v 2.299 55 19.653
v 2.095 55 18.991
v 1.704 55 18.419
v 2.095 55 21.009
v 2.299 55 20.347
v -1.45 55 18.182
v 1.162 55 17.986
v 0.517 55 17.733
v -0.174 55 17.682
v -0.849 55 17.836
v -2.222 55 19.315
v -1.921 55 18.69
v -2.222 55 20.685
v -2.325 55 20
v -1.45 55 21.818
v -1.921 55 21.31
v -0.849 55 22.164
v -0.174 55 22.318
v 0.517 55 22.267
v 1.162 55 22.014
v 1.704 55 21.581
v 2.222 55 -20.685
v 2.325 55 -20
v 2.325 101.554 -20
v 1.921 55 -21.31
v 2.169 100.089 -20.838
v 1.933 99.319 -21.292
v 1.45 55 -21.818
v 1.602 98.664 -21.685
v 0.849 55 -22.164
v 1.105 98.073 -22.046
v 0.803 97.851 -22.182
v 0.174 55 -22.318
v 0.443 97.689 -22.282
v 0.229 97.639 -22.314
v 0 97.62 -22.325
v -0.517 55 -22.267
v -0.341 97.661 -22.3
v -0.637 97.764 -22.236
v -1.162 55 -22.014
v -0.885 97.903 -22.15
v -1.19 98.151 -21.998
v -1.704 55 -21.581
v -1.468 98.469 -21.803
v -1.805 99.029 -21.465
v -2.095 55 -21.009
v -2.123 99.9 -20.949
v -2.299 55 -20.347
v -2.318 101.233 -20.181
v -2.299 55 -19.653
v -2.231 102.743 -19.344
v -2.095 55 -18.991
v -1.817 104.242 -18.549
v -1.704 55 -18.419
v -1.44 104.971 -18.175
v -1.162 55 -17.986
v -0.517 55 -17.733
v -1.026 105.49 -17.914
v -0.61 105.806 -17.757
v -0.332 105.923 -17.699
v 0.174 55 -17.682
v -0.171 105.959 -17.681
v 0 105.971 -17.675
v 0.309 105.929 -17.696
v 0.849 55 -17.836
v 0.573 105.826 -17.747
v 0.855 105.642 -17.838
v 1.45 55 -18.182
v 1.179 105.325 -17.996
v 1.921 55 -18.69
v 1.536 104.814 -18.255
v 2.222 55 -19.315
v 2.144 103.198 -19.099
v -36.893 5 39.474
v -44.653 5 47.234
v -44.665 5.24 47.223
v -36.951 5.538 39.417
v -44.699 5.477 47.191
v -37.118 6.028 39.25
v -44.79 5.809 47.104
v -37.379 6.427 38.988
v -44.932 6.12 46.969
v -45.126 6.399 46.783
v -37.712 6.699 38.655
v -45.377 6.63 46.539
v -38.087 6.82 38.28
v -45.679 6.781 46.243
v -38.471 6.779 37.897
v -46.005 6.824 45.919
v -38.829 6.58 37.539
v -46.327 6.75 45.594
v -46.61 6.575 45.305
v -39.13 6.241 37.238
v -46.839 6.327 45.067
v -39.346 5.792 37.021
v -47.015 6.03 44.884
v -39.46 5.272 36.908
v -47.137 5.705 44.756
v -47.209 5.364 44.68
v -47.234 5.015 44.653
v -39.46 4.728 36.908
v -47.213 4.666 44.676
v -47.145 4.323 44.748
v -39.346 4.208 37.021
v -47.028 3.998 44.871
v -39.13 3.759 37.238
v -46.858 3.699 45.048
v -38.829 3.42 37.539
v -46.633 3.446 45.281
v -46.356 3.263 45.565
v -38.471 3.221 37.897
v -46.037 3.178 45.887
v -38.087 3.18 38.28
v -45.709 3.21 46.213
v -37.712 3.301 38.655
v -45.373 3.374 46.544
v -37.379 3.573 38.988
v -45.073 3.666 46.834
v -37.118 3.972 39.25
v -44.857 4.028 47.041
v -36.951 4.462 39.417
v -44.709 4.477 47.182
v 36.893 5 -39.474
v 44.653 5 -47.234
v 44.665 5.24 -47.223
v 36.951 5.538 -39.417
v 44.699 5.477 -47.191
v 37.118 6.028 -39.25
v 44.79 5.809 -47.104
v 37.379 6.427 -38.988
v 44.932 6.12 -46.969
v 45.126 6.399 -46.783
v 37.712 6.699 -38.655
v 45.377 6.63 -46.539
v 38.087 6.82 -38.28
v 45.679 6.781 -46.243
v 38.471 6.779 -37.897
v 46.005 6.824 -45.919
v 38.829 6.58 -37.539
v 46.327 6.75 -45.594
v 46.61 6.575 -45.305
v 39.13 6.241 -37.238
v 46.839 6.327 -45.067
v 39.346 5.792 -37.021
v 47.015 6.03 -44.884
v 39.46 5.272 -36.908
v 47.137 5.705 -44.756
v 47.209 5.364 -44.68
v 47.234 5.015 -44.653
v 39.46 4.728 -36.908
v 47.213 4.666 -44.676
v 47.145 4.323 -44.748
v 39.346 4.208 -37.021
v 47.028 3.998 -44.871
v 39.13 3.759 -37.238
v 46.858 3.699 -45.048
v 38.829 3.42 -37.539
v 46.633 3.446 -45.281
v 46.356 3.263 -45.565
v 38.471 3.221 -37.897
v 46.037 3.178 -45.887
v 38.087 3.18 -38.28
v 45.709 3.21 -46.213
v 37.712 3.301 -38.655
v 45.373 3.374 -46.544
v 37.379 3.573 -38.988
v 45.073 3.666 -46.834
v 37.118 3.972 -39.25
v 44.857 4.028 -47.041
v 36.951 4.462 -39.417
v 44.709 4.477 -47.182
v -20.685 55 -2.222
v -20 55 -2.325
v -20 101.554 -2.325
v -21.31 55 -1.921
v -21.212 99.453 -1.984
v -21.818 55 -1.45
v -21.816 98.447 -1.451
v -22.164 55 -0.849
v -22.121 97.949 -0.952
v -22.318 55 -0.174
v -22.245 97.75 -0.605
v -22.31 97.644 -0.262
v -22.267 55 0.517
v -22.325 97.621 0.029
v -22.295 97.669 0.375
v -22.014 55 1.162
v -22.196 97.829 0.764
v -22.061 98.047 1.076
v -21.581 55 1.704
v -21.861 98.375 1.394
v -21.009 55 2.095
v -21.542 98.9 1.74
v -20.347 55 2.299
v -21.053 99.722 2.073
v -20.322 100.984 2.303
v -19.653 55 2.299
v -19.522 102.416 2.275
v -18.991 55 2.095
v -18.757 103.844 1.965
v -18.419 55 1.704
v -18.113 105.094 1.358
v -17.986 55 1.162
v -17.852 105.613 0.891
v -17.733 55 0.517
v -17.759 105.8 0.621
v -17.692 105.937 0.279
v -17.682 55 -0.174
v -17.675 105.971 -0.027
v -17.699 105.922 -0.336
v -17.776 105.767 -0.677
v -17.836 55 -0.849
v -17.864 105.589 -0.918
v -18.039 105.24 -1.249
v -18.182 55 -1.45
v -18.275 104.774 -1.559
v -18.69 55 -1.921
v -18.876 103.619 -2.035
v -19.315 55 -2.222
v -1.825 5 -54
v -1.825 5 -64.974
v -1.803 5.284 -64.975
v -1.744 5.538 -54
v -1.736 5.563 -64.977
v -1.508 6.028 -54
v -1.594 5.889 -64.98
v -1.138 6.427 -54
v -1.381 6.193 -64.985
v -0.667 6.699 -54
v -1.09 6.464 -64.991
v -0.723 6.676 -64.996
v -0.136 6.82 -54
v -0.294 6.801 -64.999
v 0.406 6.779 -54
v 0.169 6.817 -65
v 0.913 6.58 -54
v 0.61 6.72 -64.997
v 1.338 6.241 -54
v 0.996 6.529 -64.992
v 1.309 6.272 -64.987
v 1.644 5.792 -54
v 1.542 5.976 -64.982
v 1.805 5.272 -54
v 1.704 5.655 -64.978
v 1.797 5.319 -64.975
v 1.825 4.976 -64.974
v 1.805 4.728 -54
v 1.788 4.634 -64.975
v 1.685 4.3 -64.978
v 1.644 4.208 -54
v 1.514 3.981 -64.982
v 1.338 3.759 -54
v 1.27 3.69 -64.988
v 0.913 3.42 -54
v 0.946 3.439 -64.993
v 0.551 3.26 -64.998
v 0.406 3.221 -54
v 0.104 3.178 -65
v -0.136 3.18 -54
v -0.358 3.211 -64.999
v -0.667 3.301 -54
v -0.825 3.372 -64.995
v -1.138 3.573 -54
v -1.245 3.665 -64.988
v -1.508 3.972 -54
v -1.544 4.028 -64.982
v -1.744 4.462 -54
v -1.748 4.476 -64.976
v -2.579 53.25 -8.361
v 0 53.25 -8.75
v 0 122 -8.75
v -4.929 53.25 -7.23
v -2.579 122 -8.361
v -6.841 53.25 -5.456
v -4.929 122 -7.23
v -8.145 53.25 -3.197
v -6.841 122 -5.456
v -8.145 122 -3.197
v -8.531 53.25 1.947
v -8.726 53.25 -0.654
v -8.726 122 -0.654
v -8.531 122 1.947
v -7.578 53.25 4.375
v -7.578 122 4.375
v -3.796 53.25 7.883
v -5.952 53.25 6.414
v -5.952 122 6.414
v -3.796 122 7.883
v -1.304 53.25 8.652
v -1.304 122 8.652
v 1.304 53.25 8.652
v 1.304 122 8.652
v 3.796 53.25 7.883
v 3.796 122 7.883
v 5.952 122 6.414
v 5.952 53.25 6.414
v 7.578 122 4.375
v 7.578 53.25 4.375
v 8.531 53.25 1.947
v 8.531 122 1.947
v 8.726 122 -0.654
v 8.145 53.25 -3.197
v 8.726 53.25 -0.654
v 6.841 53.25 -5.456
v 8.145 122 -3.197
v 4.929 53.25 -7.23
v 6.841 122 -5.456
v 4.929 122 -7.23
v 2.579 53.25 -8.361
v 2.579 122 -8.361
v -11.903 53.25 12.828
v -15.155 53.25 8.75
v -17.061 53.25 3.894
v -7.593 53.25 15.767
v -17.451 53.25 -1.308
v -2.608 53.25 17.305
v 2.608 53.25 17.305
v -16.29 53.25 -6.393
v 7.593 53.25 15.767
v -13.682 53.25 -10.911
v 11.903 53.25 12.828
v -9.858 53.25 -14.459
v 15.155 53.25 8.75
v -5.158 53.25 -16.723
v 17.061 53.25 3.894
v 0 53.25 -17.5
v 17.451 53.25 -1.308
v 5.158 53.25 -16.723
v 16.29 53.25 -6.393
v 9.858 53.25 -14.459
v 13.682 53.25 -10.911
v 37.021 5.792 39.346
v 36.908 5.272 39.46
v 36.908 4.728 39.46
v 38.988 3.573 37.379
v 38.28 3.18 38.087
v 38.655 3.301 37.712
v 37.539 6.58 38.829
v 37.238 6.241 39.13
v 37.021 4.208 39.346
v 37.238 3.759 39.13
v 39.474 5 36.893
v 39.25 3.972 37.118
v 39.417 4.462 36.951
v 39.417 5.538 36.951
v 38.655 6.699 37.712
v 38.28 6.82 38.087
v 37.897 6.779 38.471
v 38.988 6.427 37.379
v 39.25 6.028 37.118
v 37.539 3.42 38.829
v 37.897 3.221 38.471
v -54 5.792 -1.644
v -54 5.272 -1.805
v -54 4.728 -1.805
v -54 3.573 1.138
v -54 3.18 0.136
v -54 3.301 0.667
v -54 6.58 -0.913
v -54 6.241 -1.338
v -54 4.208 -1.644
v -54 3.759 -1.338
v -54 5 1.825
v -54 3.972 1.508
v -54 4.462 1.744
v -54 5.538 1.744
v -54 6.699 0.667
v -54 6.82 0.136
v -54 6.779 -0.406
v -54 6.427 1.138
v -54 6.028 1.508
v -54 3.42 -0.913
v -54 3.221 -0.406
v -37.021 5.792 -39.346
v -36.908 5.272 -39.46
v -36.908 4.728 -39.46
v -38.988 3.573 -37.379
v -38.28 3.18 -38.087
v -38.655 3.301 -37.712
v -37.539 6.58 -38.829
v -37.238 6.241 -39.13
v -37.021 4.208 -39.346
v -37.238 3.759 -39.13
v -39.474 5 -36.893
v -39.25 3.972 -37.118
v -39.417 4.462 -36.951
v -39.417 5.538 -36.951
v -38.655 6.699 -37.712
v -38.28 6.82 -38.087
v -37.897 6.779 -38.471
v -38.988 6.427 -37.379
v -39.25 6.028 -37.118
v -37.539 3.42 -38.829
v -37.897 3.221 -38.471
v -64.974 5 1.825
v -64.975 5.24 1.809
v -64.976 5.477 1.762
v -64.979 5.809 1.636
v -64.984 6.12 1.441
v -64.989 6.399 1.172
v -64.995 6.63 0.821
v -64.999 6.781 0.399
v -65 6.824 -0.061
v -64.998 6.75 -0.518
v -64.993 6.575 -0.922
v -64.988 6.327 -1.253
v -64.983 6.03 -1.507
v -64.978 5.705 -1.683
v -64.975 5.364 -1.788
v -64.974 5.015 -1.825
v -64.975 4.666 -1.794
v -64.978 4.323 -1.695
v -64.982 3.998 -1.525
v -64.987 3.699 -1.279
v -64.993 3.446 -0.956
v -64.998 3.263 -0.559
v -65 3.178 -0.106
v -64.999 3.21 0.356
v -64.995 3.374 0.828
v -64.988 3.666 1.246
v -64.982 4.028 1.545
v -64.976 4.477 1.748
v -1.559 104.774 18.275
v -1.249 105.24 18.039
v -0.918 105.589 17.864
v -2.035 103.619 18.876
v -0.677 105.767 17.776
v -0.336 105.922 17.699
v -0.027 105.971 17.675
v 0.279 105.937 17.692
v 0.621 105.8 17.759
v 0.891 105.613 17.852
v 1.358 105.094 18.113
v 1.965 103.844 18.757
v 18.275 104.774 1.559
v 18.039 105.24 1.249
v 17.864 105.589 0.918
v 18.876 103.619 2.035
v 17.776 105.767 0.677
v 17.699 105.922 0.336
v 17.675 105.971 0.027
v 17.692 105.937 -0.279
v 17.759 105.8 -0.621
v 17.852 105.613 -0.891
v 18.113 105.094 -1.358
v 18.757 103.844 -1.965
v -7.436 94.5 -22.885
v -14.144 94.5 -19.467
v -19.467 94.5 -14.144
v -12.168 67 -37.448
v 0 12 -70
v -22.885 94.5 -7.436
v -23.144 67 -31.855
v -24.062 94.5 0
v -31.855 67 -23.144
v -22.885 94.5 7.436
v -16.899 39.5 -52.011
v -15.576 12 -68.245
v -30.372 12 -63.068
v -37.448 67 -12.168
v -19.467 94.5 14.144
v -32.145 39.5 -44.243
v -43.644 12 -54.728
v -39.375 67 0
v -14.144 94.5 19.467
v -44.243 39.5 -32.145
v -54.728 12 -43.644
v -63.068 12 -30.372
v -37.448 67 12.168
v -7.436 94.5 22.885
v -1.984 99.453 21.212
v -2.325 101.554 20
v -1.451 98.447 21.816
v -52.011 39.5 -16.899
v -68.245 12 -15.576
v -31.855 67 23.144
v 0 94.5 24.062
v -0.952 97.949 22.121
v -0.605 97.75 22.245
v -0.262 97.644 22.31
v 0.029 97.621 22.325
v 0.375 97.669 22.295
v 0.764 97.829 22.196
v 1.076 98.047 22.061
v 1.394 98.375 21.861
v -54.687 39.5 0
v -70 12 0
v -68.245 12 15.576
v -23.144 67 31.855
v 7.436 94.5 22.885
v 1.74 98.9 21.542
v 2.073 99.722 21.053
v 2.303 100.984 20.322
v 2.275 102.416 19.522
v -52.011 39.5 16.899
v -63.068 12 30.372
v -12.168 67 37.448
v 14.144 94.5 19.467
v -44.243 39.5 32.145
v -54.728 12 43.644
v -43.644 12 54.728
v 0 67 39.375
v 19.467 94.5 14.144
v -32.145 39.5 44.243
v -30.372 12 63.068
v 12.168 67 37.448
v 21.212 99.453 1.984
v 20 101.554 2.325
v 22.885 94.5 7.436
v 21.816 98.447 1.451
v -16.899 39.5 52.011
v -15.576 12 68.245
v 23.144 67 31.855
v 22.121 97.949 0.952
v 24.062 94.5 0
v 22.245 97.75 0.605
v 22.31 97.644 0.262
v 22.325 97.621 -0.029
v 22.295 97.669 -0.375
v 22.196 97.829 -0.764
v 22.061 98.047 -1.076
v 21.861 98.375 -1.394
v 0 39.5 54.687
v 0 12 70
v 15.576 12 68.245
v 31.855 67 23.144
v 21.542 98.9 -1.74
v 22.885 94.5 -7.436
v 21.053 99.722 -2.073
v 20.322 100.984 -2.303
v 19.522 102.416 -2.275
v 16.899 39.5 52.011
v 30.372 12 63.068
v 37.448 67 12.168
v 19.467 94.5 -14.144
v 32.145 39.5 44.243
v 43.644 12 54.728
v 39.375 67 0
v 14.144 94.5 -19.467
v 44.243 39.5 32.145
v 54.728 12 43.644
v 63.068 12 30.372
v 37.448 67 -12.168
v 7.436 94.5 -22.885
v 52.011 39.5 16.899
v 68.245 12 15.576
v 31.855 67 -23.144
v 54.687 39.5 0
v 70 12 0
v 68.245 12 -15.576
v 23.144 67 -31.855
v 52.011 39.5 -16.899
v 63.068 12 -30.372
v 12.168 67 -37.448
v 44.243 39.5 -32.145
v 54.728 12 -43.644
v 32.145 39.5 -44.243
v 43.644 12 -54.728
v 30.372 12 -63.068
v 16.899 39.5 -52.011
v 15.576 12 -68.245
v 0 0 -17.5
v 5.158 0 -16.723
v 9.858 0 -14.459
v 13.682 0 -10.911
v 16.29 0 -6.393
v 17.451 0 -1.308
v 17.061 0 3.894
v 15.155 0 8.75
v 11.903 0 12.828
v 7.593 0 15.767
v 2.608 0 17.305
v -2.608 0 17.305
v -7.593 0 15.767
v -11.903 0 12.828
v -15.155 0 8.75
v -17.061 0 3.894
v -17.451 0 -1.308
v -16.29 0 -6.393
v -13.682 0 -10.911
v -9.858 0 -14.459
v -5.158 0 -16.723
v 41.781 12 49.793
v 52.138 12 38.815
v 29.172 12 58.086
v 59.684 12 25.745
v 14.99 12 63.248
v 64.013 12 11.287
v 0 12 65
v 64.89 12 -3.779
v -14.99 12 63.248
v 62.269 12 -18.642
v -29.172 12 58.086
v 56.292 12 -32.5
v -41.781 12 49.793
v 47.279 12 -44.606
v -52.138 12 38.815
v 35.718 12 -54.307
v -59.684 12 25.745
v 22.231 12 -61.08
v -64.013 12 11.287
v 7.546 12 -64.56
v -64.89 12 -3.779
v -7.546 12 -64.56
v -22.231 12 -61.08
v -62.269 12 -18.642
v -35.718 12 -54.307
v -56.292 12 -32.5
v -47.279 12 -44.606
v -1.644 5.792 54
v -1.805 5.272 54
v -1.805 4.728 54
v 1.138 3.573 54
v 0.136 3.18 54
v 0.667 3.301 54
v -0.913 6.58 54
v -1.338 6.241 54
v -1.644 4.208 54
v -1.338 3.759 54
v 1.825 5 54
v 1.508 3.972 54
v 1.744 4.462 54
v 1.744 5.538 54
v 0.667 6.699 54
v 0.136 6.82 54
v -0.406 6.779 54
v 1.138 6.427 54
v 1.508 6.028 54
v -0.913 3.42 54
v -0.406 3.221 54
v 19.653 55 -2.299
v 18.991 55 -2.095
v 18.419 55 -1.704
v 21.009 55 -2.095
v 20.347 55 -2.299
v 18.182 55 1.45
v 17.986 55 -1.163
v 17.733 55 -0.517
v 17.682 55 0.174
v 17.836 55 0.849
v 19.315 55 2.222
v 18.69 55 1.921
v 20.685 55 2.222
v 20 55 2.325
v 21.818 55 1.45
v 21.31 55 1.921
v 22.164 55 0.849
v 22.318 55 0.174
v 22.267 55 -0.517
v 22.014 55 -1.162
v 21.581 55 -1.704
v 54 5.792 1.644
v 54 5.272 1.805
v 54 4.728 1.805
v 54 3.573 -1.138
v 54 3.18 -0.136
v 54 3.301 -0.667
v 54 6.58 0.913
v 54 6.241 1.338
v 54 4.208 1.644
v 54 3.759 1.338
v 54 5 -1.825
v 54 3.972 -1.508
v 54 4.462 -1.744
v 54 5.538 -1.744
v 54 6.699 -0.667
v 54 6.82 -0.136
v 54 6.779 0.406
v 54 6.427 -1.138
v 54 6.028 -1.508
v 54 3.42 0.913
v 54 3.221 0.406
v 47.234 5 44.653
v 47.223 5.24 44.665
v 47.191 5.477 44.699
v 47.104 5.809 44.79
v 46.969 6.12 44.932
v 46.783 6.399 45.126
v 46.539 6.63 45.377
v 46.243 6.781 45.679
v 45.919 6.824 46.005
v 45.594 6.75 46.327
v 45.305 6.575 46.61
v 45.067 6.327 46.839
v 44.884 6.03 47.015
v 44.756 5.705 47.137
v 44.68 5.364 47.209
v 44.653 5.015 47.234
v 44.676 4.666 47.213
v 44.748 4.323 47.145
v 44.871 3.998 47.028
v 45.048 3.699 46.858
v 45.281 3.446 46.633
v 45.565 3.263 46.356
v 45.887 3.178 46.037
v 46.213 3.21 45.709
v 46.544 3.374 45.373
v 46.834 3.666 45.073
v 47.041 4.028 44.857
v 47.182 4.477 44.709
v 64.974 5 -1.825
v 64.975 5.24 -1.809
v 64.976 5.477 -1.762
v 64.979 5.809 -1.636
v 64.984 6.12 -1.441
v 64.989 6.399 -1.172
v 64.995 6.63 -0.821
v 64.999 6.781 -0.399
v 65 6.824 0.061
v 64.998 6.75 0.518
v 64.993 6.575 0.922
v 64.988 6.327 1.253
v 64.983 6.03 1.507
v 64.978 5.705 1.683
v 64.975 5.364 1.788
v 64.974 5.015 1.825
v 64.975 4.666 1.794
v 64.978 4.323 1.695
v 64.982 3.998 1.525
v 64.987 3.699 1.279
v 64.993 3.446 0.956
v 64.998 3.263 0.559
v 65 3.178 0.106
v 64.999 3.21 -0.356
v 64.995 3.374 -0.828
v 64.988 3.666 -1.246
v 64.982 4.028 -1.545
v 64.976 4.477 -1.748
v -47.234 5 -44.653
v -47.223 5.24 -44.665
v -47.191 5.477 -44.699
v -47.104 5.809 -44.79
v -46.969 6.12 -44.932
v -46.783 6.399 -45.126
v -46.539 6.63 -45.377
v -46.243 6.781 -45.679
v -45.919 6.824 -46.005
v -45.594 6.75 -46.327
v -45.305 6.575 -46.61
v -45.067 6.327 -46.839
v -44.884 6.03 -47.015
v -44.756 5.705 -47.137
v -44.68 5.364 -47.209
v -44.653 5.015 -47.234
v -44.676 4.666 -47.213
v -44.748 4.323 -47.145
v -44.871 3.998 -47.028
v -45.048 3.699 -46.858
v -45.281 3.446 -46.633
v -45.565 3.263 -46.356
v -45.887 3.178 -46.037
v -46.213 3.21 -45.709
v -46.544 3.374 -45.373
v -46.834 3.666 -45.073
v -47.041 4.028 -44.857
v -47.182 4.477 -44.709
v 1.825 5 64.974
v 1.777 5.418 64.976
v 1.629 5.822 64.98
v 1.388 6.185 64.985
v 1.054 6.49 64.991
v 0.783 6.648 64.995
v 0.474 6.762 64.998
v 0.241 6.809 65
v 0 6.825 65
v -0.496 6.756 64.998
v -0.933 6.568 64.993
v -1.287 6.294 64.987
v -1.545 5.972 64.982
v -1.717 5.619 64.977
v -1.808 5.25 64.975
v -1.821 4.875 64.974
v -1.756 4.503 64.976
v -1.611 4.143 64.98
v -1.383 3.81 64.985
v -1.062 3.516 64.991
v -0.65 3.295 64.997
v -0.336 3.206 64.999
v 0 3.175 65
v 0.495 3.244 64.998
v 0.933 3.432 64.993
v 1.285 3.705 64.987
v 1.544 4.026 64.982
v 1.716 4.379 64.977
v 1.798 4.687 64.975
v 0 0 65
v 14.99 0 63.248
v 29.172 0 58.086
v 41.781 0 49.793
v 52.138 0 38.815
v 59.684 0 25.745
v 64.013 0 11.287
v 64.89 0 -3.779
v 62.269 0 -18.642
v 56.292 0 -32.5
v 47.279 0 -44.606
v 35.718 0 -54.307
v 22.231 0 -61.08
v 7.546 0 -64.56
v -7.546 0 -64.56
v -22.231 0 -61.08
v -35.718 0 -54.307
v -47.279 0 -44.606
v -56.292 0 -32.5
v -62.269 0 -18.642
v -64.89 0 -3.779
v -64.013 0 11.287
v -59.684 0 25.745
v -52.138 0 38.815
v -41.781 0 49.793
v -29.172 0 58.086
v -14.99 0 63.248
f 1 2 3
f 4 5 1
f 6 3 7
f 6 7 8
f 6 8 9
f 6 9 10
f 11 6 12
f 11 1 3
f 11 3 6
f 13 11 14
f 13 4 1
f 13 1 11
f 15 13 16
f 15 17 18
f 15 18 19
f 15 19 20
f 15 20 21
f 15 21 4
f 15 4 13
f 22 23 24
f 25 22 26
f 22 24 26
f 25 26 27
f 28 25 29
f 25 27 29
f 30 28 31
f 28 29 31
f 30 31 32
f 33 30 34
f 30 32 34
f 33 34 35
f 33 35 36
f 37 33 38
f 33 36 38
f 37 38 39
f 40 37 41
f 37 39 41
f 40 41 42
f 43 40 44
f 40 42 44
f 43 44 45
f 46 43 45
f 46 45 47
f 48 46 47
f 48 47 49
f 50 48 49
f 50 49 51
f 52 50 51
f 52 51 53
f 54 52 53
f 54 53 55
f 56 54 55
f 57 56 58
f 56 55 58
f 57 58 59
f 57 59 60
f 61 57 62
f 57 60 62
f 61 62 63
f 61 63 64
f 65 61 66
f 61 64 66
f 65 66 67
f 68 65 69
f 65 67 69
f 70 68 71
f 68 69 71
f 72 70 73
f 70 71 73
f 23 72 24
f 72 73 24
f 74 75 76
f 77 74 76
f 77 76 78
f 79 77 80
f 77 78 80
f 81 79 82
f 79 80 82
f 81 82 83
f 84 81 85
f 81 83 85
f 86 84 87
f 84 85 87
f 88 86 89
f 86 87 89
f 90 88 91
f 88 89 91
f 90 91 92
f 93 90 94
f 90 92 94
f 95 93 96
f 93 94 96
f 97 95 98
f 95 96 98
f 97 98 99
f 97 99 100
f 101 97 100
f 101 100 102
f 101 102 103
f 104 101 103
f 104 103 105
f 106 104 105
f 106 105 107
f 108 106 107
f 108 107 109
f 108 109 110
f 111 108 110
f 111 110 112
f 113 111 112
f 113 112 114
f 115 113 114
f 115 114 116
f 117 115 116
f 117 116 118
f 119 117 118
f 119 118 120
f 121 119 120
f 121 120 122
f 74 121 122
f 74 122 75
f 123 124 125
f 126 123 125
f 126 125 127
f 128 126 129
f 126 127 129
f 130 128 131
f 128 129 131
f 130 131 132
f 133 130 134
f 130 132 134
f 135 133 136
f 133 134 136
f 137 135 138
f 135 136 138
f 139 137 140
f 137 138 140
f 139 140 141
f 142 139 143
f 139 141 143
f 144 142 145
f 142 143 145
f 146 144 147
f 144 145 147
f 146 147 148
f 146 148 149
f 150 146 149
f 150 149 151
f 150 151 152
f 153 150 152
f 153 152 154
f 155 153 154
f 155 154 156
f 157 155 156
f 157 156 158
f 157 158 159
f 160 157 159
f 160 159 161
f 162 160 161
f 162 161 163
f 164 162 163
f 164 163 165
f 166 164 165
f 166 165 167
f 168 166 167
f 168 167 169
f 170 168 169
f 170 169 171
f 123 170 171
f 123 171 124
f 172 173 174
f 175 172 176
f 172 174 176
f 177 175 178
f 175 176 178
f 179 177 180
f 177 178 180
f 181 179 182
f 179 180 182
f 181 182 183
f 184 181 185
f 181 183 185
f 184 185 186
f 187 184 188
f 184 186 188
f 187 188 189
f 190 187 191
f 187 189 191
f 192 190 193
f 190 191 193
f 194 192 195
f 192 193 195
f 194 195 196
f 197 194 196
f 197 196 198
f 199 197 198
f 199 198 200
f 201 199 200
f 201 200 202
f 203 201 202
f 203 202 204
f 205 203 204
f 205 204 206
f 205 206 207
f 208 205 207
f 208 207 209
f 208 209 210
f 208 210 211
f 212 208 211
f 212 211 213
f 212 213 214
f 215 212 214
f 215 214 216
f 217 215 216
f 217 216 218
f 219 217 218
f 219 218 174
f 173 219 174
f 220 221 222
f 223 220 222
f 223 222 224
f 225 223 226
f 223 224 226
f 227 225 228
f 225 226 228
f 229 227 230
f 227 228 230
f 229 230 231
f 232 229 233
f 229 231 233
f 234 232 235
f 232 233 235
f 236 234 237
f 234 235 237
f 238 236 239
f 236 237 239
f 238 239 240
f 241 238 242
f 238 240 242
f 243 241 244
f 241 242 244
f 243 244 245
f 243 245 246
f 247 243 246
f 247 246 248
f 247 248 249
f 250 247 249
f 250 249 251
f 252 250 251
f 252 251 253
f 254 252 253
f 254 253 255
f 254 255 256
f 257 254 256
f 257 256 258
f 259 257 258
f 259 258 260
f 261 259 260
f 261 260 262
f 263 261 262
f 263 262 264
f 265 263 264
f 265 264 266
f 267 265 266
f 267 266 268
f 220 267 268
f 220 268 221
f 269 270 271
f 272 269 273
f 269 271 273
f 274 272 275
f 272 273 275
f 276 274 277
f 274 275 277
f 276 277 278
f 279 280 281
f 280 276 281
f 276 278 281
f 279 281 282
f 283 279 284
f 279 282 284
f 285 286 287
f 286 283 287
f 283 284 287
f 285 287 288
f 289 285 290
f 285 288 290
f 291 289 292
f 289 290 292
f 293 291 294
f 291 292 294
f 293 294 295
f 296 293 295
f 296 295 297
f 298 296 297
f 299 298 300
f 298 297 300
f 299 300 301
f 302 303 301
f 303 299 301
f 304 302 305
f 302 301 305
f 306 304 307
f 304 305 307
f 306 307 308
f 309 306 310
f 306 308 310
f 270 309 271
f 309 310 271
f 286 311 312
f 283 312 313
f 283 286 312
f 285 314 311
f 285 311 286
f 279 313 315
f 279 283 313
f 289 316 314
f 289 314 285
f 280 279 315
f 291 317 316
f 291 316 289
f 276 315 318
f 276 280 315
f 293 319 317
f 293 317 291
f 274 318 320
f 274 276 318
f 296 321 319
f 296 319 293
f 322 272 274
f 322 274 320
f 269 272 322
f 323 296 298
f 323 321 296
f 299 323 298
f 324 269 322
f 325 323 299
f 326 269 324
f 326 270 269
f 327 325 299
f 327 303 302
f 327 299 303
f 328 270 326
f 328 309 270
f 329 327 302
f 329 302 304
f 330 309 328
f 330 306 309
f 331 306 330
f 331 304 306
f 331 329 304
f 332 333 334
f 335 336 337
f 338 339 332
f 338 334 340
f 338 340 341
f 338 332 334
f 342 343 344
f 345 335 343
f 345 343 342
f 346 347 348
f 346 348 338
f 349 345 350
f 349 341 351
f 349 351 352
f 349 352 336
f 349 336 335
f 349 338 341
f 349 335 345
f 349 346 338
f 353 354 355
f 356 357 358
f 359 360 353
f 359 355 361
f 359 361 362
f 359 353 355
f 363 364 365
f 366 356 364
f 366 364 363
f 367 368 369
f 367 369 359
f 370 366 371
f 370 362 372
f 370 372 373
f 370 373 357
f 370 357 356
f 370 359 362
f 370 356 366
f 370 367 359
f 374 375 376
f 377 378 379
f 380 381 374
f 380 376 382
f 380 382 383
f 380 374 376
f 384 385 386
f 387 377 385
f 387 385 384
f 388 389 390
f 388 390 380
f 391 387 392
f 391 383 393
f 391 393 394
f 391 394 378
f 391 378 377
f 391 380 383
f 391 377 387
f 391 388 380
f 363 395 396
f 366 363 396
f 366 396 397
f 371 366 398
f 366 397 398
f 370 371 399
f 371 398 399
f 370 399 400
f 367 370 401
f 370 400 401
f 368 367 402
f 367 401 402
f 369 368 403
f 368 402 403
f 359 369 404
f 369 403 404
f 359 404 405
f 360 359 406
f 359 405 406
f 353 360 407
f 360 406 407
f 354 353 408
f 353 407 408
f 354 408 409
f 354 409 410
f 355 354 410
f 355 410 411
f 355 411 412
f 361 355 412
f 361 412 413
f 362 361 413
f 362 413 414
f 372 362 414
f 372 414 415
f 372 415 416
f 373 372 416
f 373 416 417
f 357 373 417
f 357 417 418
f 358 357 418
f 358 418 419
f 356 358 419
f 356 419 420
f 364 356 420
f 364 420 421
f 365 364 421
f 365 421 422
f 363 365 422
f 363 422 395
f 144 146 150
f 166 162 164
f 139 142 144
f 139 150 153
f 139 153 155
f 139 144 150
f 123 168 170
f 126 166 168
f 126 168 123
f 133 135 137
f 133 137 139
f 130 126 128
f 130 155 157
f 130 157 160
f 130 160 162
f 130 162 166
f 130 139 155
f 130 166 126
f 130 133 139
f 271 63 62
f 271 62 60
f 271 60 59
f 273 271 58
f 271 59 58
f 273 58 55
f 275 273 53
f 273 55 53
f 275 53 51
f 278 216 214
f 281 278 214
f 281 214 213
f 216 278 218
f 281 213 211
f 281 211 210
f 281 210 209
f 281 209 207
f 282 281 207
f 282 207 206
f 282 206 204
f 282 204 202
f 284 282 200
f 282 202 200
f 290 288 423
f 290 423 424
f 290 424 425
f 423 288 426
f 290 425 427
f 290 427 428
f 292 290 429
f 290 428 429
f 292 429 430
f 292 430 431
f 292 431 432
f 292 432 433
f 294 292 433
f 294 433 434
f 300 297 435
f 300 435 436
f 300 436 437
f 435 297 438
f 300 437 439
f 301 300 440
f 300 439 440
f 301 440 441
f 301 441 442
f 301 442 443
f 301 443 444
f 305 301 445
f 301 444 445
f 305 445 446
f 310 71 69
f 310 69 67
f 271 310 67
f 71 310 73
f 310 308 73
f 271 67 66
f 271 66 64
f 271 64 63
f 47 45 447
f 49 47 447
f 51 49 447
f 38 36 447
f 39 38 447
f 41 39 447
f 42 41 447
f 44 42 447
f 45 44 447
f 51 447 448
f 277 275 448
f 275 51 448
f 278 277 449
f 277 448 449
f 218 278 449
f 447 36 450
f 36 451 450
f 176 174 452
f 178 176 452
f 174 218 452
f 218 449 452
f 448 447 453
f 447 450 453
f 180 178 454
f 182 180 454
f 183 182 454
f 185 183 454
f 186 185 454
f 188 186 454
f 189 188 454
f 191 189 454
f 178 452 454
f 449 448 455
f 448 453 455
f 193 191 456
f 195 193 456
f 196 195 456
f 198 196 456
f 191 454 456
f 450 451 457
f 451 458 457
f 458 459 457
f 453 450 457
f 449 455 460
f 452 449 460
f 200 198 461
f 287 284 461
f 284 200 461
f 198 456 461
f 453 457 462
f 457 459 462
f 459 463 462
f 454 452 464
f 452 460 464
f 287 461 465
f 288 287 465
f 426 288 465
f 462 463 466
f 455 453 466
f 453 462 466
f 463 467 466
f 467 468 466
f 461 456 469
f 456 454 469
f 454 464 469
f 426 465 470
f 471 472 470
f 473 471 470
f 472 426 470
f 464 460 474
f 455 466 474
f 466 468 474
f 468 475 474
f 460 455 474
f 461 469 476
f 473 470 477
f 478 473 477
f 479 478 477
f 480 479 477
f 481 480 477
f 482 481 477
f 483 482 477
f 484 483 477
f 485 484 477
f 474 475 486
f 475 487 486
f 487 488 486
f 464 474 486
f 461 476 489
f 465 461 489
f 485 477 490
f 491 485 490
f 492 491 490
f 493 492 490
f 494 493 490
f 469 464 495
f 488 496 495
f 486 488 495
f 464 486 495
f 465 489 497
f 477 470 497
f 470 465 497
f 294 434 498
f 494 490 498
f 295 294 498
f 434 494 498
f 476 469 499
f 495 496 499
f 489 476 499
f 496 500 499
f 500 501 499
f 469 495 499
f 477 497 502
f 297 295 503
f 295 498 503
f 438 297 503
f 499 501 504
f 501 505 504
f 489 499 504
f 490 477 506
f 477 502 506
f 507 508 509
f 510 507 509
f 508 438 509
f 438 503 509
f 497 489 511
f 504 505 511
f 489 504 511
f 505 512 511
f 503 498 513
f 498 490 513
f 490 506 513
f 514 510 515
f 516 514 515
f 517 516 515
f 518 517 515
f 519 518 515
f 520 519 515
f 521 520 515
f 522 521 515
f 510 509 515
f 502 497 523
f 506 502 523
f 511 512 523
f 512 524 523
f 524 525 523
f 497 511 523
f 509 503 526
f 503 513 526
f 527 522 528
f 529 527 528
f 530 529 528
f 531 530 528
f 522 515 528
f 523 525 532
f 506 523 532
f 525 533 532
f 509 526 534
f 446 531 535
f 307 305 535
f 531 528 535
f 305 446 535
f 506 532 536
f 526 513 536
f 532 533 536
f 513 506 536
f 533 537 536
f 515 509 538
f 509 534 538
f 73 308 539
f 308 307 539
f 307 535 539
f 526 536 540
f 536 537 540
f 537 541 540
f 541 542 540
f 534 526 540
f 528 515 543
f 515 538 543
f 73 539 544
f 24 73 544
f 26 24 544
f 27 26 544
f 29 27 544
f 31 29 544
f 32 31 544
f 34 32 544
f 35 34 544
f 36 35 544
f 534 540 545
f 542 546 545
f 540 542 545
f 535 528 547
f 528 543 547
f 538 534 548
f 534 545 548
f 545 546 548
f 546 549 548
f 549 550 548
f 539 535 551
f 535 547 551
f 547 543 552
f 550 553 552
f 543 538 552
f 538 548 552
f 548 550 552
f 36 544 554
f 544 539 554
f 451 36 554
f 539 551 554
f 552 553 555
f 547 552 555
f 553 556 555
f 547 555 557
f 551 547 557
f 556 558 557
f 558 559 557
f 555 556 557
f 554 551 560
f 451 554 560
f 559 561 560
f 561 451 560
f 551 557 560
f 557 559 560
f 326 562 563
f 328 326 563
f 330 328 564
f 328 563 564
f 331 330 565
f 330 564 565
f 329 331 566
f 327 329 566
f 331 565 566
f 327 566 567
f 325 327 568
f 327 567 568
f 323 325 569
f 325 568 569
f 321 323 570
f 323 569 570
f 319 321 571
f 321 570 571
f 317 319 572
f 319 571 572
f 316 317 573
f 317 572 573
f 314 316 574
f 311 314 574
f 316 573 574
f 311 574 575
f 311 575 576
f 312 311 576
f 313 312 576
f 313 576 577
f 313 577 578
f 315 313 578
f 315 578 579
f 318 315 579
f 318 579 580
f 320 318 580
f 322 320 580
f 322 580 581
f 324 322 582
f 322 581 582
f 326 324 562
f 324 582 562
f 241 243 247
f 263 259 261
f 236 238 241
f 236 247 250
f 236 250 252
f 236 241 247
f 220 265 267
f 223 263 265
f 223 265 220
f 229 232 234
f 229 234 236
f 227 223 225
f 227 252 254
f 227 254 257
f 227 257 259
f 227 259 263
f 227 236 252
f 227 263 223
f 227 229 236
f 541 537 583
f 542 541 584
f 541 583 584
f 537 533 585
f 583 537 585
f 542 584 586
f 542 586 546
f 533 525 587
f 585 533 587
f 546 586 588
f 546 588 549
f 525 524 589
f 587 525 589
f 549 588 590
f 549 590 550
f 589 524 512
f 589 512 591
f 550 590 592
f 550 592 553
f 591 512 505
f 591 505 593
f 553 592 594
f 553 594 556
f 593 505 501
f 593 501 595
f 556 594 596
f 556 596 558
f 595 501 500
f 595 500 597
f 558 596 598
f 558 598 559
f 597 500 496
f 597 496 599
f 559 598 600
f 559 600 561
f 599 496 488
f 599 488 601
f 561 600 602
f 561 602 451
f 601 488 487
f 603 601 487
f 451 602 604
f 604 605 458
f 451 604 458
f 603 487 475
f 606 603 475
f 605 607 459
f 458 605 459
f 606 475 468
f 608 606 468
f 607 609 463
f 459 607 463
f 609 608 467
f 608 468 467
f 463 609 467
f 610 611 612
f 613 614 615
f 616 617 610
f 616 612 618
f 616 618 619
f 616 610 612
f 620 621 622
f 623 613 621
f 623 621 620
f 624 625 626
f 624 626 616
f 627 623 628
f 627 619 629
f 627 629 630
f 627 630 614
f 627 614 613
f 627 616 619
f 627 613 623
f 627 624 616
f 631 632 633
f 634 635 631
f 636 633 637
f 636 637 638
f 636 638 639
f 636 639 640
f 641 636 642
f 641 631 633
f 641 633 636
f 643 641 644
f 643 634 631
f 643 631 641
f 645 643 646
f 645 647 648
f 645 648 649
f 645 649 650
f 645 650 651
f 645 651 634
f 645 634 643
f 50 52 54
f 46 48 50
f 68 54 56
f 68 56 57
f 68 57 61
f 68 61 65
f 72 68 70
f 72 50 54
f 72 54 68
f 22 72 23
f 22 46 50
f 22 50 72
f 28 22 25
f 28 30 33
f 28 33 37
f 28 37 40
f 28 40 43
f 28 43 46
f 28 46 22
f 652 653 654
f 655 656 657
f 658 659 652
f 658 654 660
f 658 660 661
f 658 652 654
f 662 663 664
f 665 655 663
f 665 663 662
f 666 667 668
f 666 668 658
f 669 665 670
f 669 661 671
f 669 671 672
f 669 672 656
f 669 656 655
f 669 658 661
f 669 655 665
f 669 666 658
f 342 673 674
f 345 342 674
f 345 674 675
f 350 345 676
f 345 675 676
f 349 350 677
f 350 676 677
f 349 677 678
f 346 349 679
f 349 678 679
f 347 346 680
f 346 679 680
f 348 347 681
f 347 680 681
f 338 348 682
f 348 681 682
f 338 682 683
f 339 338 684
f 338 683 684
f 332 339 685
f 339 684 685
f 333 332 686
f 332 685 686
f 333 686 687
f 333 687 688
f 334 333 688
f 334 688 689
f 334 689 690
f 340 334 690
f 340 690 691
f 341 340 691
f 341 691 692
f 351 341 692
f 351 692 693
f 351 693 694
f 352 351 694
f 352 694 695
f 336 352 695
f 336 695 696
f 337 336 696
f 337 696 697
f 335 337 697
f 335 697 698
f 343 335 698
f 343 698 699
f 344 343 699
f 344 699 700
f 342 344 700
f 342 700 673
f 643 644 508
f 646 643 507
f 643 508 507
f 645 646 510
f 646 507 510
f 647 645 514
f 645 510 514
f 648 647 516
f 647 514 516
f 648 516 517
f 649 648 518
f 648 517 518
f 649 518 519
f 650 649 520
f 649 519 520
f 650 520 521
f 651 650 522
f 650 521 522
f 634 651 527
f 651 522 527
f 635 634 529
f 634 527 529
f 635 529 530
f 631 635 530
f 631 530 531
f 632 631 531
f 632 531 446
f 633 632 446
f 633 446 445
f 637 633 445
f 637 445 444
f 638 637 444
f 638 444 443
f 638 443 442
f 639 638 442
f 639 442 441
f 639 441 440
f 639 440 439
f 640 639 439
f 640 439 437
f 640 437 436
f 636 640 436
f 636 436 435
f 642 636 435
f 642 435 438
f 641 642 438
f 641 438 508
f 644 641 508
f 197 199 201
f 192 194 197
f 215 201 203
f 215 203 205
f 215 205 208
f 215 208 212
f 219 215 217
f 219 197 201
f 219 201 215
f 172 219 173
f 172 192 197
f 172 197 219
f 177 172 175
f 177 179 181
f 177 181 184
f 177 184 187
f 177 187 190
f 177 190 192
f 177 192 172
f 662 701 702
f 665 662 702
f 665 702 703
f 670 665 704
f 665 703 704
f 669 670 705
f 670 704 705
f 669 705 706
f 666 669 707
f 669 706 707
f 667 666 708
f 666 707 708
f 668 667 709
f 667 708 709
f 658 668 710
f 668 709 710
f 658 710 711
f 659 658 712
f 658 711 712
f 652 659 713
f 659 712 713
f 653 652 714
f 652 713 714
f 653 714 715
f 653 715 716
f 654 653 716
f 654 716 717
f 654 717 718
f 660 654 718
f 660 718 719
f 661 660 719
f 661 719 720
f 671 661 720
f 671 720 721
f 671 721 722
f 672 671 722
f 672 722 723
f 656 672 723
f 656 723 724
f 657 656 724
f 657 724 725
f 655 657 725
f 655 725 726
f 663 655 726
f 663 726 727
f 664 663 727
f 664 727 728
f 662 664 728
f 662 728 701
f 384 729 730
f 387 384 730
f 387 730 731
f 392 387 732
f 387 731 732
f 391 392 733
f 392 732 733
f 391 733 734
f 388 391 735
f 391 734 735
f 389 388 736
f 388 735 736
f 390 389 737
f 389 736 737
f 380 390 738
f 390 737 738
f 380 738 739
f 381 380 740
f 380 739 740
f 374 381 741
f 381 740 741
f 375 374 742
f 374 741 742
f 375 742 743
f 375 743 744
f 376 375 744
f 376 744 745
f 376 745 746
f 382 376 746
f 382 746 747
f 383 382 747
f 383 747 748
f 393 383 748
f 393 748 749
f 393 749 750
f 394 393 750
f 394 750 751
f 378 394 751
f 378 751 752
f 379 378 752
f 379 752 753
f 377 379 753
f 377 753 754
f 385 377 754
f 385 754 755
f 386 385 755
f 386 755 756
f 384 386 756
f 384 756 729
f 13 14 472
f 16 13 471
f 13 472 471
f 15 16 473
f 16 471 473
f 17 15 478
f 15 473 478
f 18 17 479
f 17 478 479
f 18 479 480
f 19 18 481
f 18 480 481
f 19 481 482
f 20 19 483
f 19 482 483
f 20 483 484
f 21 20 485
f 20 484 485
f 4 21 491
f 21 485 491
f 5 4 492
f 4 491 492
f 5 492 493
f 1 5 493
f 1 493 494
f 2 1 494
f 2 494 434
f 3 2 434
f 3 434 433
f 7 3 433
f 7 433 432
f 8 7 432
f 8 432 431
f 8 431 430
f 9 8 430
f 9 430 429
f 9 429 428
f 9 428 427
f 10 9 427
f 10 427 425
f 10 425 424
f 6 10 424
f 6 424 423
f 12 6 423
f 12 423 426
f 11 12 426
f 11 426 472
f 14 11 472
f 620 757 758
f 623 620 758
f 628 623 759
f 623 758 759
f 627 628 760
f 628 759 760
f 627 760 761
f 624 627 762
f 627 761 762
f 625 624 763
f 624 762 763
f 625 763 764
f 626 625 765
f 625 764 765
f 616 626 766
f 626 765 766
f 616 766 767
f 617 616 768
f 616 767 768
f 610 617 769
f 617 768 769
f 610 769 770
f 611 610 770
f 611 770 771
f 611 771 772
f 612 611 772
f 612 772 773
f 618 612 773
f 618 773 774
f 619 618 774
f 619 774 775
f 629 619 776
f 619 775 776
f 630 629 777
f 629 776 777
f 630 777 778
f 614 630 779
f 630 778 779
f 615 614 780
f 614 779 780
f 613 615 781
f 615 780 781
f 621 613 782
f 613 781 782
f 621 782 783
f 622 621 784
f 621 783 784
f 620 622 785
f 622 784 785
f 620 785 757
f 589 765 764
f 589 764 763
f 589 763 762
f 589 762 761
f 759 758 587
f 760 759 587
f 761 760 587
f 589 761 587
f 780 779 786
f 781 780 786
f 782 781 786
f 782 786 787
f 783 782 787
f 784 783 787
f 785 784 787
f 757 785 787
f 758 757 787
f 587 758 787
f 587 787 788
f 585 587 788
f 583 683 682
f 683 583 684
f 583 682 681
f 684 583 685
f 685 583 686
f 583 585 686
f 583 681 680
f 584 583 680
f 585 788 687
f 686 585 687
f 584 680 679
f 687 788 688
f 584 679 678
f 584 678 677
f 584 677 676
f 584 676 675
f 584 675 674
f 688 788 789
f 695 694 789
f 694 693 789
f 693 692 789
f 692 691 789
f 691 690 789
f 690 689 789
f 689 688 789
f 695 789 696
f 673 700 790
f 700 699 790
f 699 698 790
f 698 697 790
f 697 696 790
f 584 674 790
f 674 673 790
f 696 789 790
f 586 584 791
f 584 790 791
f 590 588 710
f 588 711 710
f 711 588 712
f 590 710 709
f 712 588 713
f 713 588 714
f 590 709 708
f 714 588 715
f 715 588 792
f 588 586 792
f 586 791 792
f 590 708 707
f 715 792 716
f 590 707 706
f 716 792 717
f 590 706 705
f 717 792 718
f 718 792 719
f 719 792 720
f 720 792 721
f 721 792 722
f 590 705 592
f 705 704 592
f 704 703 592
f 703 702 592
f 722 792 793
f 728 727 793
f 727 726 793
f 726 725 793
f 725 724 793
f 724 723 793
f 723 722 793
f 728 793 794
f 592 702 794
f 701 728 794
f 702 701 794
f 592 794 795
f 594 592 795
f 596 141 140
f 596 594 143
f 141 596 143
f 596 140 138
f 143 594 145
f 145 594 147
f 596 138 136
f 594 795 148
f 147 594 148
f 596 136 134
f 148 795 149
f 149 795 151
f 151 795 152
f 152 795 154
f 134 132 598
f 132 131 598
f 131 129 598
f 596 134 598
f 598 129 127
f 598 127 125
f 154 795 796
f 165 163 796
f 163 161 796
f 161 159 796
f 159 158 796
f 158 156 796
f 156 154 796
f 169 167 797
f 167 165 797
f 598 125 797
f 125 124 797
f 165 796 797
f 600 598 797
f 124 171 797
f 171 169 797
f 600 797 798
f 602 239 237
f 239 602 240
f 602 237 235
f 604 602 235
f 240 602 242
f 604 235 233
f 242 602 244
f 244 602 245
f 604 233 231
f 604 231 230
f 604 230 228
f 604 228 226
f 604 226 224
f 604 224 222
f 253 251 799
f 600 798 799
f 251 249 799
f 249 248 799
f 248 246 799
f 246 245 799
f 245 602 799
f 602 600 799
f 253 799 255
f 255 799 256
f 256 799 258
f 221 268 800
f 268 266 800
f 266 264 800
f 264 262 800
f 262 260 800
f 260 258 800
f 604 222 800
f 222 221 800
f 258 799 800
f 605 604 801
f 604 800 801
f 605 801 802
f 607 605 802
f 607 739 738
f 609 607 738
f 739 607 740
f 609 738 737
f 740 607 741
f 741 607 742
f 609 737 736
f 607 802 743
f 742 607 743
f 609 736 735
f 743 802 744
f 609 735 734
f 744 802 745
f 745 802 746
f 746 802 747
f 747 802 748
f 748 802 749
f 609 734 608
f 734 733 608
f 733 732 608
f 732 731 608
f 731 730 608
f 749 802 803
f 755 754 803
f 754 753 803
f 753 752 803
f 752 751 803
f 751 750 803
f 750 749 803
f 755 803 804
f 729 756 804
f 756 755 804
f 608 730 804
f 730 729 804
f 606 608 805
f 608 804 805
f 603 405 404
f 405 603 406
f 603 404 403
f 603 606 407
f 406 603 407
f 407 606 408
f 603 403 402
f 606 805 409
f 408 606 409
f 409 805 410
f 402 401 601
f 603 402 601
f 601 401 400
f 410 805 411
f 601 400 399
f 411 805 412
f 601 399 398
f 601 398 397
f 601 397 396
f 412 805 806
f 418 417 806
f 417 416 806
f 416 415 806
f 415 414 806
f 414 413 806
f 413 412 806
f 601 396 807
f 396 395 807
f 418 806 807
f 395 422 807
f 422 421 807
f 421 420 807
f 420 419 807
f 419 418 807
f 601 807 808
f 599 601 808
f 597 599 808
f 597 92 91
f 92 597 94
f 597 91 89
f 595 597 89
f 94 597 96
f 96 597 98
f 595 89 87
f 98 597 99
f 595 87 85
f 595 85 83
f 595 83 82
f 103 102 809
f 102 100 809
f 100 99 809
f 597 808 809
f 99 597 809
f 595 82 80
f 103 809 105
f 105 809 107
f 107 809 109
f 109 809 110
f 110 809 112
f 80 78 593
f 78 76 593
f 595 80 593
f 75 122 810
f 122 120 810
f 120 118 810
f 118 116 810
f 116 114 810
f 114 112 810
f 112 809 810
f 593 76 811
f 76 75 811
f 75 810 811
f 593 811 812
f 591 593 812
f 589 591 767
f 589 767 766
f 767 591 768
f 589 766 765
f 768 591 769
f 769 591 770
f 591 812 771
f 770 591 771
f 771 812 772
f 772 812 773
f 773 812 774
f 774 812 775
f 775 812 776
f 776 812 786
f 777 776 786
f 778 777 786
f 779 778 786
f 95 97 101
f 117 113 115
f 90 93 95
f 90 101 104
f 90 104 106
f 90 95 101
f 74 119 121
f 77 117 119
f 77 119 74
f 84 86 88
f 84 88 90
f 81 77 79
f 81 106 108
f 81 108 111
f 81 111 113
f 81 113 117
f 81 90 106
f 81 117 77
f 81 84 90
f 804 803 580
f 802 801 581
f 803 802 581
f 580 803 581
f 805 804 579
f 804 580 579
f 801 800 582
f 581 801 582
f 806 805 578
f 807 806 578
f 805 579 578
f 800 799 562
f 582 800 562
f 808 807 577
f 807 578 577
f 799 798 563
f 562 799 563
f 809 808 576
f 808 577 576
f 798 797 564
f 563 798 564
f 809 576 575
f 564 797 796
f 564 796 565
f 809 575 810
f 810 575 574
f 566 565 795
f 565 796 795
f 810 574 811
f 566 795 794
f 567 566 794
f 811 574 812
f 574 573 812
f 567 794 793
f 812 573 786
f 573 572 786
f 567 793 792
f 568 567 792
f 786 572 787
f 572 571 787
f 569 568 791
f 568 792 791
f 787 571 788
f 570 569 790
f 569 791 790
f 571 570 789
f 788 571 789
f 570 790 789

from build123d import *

# Parameters (mm, degrees)
SKETCH1_R           = 65
SKETCH1_R_2         = 8.75
BOSS_EXTRUDE1_DEPTH = 12
SKETCH2_R           = 1.825
CUT_EXTRUDE1_DEPTH  = 11
CIRPATTERN1_COUNT   = 8
SKETCH9_R           = 2.325
CUT_EXTRUDE3_DEPTH  = 65
CIRPATTERN2_COUNT   = 4
SKETCH11_R          = 17.5
CUT_EXTRUDE5_DEPTH  = 53.25


with BuildPart() as part:
    # Sketch1 → Boss-Extrude1 (new body)
    with BuildSketch(Plane(origin=(0, 0, 0), x_dir=(1, 0, 0), z_dir=(0, 1, 0))):
        with Locations(Location((0, 0, 0), (0, 0, 270))):
            Circle(SKETCH1_R)
        with Locations(Location((0, 0, 0), (0, 0, 270))):
            Circle(SKETCH1_R_2, mode=Mode.SUBTRACT)
    extrude(amount=BOSS_EXTRUDE1_DEPTH)

    # Sketch2 → Cut-Extrude1 (cut)
    with BuildSketch(Plane.ZY.offset(65)):
        with Locations((0, 5)):
            Circle(SKETCH2_R)
    cut_extrude1 = extrude(amount=-CUT_EXTRUDE1_DEPTH, mode=Mode.SUBTRACT)

    # CirPattern1: Cut-Extrude1 ×8 about axis
    cirpattern1_axis = Axis((0, 0, 0), (0, 1, 0))
    for i in range(1, CIRPATTERN1_COUNT):
        add(cut_extrude1.rotate(cirpattern1_axis, i * 360 / CIRPATTERN1_COUNT), mode=Mode.SUBTRACT)

    # Sketch6 → Revolve1 (revolve)
    with BuildSketch(Plane.XY, mode=Mode.PRIVATE) as revolve1_sk:
        Polygon((-8.75, 12), (-8.75, 122), (-70, 12), align=None)
    revolve(revolve1_sk.sketch.rotate(Axis((0, -6, 0), (0, 1, 0)), 270), axis=Axis((0, -6, 0), (0, 1, 0)))

    # Sketch9 → Cut-Extrude3 (cut)
    with BuildSketch(Plane(origin=(0, 120, 0), x_dir=(1, 0, 0), z_dir=(0, 1, 0))):
        with Locations(Location((20, 0, 0), (0, 0, 270))):
            Circle(SKETCH9_R)
    cut_extrude3 = extrude(amount=-CUT_EXTRUDE3_DEPTH, mode=Mode.SUBTRACT)

    # CirPattern2: Cut-Extrude3 ×4 about axis
    cirpattern2_axis = Axis((0, 0, 0), (0, 1, 0))
    for i in range(1, CIRPATTERN2_COUNT):
        add(cut_extrude3.rotate(cirpattern2_axis, i * 360 / CIRPATTERN2_COUNT), mode=Mode.SUBTRACT)

    # Sketch11 → Cut-Extrude5 (cut)
    with BuildSketch(Plane.XZ):
        with Locations(Location((0, 0, 0), (0, 0, 270))):
            Circle(SKETCH11_R)
    extrude(amount=-CUT_EXTRUDE5_DEPTH, mode=Mode.SUBTRACT)


solid = part.part
